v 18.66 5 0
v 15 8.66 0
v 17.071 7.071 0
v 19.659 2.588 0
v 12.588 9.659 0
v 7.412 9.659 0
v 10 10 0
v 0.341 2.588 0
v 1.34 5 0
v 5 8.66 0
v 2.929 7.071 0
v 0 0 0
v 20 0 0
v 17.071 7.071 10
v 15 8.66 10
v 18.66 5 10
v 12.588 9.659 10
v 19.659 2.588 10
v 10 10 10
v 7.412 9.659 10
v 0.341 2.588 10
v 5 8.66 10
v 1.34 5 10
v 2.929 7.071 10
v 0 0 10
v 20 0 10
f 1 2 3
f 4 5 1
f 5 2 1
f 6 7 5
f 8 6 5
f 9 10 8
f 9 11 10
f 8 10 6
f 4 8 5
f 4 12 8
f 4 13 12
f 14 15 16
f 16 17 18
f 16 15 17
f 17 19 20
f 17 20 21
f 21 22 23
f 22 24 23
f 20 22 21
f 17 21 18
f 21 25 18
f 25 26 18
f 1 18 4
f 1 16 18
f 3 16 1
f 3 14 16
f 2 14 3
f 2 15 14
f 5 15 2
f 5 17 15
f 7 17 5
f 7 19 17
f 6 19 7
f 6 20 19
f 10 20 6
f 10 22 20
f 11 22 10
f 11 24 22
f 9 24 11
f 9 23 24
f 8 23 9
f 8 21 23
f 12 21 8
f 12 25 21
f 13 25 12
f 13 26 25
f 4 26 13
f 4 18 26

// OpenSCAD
$fn = 32;

// ----------------------------------------------------------------------
// Key bar: woodruff key, 10 mm thick
// ----------------------------------------------------------------------

// --- parameters (mm) ---
profile_height = 10;      // extrusion height
profile_points = 13;      // points of the closed outline

profile = [[20, 0], [19.659, 2.588], [18.66, 5], [17.071, 7.071], [15, 8.66], [12.588, 9.659], [10, 10], [7.412, 9.659], [5, 8.66], [2.929, 7.071], [1.34, 5], [0.341, 2.588], [0, 0]];  // single closed polygon, 13 points, counter clockwise

// --- the one profile operation ---
linear_extrude(height = profile_height) polygon(points = profile);
